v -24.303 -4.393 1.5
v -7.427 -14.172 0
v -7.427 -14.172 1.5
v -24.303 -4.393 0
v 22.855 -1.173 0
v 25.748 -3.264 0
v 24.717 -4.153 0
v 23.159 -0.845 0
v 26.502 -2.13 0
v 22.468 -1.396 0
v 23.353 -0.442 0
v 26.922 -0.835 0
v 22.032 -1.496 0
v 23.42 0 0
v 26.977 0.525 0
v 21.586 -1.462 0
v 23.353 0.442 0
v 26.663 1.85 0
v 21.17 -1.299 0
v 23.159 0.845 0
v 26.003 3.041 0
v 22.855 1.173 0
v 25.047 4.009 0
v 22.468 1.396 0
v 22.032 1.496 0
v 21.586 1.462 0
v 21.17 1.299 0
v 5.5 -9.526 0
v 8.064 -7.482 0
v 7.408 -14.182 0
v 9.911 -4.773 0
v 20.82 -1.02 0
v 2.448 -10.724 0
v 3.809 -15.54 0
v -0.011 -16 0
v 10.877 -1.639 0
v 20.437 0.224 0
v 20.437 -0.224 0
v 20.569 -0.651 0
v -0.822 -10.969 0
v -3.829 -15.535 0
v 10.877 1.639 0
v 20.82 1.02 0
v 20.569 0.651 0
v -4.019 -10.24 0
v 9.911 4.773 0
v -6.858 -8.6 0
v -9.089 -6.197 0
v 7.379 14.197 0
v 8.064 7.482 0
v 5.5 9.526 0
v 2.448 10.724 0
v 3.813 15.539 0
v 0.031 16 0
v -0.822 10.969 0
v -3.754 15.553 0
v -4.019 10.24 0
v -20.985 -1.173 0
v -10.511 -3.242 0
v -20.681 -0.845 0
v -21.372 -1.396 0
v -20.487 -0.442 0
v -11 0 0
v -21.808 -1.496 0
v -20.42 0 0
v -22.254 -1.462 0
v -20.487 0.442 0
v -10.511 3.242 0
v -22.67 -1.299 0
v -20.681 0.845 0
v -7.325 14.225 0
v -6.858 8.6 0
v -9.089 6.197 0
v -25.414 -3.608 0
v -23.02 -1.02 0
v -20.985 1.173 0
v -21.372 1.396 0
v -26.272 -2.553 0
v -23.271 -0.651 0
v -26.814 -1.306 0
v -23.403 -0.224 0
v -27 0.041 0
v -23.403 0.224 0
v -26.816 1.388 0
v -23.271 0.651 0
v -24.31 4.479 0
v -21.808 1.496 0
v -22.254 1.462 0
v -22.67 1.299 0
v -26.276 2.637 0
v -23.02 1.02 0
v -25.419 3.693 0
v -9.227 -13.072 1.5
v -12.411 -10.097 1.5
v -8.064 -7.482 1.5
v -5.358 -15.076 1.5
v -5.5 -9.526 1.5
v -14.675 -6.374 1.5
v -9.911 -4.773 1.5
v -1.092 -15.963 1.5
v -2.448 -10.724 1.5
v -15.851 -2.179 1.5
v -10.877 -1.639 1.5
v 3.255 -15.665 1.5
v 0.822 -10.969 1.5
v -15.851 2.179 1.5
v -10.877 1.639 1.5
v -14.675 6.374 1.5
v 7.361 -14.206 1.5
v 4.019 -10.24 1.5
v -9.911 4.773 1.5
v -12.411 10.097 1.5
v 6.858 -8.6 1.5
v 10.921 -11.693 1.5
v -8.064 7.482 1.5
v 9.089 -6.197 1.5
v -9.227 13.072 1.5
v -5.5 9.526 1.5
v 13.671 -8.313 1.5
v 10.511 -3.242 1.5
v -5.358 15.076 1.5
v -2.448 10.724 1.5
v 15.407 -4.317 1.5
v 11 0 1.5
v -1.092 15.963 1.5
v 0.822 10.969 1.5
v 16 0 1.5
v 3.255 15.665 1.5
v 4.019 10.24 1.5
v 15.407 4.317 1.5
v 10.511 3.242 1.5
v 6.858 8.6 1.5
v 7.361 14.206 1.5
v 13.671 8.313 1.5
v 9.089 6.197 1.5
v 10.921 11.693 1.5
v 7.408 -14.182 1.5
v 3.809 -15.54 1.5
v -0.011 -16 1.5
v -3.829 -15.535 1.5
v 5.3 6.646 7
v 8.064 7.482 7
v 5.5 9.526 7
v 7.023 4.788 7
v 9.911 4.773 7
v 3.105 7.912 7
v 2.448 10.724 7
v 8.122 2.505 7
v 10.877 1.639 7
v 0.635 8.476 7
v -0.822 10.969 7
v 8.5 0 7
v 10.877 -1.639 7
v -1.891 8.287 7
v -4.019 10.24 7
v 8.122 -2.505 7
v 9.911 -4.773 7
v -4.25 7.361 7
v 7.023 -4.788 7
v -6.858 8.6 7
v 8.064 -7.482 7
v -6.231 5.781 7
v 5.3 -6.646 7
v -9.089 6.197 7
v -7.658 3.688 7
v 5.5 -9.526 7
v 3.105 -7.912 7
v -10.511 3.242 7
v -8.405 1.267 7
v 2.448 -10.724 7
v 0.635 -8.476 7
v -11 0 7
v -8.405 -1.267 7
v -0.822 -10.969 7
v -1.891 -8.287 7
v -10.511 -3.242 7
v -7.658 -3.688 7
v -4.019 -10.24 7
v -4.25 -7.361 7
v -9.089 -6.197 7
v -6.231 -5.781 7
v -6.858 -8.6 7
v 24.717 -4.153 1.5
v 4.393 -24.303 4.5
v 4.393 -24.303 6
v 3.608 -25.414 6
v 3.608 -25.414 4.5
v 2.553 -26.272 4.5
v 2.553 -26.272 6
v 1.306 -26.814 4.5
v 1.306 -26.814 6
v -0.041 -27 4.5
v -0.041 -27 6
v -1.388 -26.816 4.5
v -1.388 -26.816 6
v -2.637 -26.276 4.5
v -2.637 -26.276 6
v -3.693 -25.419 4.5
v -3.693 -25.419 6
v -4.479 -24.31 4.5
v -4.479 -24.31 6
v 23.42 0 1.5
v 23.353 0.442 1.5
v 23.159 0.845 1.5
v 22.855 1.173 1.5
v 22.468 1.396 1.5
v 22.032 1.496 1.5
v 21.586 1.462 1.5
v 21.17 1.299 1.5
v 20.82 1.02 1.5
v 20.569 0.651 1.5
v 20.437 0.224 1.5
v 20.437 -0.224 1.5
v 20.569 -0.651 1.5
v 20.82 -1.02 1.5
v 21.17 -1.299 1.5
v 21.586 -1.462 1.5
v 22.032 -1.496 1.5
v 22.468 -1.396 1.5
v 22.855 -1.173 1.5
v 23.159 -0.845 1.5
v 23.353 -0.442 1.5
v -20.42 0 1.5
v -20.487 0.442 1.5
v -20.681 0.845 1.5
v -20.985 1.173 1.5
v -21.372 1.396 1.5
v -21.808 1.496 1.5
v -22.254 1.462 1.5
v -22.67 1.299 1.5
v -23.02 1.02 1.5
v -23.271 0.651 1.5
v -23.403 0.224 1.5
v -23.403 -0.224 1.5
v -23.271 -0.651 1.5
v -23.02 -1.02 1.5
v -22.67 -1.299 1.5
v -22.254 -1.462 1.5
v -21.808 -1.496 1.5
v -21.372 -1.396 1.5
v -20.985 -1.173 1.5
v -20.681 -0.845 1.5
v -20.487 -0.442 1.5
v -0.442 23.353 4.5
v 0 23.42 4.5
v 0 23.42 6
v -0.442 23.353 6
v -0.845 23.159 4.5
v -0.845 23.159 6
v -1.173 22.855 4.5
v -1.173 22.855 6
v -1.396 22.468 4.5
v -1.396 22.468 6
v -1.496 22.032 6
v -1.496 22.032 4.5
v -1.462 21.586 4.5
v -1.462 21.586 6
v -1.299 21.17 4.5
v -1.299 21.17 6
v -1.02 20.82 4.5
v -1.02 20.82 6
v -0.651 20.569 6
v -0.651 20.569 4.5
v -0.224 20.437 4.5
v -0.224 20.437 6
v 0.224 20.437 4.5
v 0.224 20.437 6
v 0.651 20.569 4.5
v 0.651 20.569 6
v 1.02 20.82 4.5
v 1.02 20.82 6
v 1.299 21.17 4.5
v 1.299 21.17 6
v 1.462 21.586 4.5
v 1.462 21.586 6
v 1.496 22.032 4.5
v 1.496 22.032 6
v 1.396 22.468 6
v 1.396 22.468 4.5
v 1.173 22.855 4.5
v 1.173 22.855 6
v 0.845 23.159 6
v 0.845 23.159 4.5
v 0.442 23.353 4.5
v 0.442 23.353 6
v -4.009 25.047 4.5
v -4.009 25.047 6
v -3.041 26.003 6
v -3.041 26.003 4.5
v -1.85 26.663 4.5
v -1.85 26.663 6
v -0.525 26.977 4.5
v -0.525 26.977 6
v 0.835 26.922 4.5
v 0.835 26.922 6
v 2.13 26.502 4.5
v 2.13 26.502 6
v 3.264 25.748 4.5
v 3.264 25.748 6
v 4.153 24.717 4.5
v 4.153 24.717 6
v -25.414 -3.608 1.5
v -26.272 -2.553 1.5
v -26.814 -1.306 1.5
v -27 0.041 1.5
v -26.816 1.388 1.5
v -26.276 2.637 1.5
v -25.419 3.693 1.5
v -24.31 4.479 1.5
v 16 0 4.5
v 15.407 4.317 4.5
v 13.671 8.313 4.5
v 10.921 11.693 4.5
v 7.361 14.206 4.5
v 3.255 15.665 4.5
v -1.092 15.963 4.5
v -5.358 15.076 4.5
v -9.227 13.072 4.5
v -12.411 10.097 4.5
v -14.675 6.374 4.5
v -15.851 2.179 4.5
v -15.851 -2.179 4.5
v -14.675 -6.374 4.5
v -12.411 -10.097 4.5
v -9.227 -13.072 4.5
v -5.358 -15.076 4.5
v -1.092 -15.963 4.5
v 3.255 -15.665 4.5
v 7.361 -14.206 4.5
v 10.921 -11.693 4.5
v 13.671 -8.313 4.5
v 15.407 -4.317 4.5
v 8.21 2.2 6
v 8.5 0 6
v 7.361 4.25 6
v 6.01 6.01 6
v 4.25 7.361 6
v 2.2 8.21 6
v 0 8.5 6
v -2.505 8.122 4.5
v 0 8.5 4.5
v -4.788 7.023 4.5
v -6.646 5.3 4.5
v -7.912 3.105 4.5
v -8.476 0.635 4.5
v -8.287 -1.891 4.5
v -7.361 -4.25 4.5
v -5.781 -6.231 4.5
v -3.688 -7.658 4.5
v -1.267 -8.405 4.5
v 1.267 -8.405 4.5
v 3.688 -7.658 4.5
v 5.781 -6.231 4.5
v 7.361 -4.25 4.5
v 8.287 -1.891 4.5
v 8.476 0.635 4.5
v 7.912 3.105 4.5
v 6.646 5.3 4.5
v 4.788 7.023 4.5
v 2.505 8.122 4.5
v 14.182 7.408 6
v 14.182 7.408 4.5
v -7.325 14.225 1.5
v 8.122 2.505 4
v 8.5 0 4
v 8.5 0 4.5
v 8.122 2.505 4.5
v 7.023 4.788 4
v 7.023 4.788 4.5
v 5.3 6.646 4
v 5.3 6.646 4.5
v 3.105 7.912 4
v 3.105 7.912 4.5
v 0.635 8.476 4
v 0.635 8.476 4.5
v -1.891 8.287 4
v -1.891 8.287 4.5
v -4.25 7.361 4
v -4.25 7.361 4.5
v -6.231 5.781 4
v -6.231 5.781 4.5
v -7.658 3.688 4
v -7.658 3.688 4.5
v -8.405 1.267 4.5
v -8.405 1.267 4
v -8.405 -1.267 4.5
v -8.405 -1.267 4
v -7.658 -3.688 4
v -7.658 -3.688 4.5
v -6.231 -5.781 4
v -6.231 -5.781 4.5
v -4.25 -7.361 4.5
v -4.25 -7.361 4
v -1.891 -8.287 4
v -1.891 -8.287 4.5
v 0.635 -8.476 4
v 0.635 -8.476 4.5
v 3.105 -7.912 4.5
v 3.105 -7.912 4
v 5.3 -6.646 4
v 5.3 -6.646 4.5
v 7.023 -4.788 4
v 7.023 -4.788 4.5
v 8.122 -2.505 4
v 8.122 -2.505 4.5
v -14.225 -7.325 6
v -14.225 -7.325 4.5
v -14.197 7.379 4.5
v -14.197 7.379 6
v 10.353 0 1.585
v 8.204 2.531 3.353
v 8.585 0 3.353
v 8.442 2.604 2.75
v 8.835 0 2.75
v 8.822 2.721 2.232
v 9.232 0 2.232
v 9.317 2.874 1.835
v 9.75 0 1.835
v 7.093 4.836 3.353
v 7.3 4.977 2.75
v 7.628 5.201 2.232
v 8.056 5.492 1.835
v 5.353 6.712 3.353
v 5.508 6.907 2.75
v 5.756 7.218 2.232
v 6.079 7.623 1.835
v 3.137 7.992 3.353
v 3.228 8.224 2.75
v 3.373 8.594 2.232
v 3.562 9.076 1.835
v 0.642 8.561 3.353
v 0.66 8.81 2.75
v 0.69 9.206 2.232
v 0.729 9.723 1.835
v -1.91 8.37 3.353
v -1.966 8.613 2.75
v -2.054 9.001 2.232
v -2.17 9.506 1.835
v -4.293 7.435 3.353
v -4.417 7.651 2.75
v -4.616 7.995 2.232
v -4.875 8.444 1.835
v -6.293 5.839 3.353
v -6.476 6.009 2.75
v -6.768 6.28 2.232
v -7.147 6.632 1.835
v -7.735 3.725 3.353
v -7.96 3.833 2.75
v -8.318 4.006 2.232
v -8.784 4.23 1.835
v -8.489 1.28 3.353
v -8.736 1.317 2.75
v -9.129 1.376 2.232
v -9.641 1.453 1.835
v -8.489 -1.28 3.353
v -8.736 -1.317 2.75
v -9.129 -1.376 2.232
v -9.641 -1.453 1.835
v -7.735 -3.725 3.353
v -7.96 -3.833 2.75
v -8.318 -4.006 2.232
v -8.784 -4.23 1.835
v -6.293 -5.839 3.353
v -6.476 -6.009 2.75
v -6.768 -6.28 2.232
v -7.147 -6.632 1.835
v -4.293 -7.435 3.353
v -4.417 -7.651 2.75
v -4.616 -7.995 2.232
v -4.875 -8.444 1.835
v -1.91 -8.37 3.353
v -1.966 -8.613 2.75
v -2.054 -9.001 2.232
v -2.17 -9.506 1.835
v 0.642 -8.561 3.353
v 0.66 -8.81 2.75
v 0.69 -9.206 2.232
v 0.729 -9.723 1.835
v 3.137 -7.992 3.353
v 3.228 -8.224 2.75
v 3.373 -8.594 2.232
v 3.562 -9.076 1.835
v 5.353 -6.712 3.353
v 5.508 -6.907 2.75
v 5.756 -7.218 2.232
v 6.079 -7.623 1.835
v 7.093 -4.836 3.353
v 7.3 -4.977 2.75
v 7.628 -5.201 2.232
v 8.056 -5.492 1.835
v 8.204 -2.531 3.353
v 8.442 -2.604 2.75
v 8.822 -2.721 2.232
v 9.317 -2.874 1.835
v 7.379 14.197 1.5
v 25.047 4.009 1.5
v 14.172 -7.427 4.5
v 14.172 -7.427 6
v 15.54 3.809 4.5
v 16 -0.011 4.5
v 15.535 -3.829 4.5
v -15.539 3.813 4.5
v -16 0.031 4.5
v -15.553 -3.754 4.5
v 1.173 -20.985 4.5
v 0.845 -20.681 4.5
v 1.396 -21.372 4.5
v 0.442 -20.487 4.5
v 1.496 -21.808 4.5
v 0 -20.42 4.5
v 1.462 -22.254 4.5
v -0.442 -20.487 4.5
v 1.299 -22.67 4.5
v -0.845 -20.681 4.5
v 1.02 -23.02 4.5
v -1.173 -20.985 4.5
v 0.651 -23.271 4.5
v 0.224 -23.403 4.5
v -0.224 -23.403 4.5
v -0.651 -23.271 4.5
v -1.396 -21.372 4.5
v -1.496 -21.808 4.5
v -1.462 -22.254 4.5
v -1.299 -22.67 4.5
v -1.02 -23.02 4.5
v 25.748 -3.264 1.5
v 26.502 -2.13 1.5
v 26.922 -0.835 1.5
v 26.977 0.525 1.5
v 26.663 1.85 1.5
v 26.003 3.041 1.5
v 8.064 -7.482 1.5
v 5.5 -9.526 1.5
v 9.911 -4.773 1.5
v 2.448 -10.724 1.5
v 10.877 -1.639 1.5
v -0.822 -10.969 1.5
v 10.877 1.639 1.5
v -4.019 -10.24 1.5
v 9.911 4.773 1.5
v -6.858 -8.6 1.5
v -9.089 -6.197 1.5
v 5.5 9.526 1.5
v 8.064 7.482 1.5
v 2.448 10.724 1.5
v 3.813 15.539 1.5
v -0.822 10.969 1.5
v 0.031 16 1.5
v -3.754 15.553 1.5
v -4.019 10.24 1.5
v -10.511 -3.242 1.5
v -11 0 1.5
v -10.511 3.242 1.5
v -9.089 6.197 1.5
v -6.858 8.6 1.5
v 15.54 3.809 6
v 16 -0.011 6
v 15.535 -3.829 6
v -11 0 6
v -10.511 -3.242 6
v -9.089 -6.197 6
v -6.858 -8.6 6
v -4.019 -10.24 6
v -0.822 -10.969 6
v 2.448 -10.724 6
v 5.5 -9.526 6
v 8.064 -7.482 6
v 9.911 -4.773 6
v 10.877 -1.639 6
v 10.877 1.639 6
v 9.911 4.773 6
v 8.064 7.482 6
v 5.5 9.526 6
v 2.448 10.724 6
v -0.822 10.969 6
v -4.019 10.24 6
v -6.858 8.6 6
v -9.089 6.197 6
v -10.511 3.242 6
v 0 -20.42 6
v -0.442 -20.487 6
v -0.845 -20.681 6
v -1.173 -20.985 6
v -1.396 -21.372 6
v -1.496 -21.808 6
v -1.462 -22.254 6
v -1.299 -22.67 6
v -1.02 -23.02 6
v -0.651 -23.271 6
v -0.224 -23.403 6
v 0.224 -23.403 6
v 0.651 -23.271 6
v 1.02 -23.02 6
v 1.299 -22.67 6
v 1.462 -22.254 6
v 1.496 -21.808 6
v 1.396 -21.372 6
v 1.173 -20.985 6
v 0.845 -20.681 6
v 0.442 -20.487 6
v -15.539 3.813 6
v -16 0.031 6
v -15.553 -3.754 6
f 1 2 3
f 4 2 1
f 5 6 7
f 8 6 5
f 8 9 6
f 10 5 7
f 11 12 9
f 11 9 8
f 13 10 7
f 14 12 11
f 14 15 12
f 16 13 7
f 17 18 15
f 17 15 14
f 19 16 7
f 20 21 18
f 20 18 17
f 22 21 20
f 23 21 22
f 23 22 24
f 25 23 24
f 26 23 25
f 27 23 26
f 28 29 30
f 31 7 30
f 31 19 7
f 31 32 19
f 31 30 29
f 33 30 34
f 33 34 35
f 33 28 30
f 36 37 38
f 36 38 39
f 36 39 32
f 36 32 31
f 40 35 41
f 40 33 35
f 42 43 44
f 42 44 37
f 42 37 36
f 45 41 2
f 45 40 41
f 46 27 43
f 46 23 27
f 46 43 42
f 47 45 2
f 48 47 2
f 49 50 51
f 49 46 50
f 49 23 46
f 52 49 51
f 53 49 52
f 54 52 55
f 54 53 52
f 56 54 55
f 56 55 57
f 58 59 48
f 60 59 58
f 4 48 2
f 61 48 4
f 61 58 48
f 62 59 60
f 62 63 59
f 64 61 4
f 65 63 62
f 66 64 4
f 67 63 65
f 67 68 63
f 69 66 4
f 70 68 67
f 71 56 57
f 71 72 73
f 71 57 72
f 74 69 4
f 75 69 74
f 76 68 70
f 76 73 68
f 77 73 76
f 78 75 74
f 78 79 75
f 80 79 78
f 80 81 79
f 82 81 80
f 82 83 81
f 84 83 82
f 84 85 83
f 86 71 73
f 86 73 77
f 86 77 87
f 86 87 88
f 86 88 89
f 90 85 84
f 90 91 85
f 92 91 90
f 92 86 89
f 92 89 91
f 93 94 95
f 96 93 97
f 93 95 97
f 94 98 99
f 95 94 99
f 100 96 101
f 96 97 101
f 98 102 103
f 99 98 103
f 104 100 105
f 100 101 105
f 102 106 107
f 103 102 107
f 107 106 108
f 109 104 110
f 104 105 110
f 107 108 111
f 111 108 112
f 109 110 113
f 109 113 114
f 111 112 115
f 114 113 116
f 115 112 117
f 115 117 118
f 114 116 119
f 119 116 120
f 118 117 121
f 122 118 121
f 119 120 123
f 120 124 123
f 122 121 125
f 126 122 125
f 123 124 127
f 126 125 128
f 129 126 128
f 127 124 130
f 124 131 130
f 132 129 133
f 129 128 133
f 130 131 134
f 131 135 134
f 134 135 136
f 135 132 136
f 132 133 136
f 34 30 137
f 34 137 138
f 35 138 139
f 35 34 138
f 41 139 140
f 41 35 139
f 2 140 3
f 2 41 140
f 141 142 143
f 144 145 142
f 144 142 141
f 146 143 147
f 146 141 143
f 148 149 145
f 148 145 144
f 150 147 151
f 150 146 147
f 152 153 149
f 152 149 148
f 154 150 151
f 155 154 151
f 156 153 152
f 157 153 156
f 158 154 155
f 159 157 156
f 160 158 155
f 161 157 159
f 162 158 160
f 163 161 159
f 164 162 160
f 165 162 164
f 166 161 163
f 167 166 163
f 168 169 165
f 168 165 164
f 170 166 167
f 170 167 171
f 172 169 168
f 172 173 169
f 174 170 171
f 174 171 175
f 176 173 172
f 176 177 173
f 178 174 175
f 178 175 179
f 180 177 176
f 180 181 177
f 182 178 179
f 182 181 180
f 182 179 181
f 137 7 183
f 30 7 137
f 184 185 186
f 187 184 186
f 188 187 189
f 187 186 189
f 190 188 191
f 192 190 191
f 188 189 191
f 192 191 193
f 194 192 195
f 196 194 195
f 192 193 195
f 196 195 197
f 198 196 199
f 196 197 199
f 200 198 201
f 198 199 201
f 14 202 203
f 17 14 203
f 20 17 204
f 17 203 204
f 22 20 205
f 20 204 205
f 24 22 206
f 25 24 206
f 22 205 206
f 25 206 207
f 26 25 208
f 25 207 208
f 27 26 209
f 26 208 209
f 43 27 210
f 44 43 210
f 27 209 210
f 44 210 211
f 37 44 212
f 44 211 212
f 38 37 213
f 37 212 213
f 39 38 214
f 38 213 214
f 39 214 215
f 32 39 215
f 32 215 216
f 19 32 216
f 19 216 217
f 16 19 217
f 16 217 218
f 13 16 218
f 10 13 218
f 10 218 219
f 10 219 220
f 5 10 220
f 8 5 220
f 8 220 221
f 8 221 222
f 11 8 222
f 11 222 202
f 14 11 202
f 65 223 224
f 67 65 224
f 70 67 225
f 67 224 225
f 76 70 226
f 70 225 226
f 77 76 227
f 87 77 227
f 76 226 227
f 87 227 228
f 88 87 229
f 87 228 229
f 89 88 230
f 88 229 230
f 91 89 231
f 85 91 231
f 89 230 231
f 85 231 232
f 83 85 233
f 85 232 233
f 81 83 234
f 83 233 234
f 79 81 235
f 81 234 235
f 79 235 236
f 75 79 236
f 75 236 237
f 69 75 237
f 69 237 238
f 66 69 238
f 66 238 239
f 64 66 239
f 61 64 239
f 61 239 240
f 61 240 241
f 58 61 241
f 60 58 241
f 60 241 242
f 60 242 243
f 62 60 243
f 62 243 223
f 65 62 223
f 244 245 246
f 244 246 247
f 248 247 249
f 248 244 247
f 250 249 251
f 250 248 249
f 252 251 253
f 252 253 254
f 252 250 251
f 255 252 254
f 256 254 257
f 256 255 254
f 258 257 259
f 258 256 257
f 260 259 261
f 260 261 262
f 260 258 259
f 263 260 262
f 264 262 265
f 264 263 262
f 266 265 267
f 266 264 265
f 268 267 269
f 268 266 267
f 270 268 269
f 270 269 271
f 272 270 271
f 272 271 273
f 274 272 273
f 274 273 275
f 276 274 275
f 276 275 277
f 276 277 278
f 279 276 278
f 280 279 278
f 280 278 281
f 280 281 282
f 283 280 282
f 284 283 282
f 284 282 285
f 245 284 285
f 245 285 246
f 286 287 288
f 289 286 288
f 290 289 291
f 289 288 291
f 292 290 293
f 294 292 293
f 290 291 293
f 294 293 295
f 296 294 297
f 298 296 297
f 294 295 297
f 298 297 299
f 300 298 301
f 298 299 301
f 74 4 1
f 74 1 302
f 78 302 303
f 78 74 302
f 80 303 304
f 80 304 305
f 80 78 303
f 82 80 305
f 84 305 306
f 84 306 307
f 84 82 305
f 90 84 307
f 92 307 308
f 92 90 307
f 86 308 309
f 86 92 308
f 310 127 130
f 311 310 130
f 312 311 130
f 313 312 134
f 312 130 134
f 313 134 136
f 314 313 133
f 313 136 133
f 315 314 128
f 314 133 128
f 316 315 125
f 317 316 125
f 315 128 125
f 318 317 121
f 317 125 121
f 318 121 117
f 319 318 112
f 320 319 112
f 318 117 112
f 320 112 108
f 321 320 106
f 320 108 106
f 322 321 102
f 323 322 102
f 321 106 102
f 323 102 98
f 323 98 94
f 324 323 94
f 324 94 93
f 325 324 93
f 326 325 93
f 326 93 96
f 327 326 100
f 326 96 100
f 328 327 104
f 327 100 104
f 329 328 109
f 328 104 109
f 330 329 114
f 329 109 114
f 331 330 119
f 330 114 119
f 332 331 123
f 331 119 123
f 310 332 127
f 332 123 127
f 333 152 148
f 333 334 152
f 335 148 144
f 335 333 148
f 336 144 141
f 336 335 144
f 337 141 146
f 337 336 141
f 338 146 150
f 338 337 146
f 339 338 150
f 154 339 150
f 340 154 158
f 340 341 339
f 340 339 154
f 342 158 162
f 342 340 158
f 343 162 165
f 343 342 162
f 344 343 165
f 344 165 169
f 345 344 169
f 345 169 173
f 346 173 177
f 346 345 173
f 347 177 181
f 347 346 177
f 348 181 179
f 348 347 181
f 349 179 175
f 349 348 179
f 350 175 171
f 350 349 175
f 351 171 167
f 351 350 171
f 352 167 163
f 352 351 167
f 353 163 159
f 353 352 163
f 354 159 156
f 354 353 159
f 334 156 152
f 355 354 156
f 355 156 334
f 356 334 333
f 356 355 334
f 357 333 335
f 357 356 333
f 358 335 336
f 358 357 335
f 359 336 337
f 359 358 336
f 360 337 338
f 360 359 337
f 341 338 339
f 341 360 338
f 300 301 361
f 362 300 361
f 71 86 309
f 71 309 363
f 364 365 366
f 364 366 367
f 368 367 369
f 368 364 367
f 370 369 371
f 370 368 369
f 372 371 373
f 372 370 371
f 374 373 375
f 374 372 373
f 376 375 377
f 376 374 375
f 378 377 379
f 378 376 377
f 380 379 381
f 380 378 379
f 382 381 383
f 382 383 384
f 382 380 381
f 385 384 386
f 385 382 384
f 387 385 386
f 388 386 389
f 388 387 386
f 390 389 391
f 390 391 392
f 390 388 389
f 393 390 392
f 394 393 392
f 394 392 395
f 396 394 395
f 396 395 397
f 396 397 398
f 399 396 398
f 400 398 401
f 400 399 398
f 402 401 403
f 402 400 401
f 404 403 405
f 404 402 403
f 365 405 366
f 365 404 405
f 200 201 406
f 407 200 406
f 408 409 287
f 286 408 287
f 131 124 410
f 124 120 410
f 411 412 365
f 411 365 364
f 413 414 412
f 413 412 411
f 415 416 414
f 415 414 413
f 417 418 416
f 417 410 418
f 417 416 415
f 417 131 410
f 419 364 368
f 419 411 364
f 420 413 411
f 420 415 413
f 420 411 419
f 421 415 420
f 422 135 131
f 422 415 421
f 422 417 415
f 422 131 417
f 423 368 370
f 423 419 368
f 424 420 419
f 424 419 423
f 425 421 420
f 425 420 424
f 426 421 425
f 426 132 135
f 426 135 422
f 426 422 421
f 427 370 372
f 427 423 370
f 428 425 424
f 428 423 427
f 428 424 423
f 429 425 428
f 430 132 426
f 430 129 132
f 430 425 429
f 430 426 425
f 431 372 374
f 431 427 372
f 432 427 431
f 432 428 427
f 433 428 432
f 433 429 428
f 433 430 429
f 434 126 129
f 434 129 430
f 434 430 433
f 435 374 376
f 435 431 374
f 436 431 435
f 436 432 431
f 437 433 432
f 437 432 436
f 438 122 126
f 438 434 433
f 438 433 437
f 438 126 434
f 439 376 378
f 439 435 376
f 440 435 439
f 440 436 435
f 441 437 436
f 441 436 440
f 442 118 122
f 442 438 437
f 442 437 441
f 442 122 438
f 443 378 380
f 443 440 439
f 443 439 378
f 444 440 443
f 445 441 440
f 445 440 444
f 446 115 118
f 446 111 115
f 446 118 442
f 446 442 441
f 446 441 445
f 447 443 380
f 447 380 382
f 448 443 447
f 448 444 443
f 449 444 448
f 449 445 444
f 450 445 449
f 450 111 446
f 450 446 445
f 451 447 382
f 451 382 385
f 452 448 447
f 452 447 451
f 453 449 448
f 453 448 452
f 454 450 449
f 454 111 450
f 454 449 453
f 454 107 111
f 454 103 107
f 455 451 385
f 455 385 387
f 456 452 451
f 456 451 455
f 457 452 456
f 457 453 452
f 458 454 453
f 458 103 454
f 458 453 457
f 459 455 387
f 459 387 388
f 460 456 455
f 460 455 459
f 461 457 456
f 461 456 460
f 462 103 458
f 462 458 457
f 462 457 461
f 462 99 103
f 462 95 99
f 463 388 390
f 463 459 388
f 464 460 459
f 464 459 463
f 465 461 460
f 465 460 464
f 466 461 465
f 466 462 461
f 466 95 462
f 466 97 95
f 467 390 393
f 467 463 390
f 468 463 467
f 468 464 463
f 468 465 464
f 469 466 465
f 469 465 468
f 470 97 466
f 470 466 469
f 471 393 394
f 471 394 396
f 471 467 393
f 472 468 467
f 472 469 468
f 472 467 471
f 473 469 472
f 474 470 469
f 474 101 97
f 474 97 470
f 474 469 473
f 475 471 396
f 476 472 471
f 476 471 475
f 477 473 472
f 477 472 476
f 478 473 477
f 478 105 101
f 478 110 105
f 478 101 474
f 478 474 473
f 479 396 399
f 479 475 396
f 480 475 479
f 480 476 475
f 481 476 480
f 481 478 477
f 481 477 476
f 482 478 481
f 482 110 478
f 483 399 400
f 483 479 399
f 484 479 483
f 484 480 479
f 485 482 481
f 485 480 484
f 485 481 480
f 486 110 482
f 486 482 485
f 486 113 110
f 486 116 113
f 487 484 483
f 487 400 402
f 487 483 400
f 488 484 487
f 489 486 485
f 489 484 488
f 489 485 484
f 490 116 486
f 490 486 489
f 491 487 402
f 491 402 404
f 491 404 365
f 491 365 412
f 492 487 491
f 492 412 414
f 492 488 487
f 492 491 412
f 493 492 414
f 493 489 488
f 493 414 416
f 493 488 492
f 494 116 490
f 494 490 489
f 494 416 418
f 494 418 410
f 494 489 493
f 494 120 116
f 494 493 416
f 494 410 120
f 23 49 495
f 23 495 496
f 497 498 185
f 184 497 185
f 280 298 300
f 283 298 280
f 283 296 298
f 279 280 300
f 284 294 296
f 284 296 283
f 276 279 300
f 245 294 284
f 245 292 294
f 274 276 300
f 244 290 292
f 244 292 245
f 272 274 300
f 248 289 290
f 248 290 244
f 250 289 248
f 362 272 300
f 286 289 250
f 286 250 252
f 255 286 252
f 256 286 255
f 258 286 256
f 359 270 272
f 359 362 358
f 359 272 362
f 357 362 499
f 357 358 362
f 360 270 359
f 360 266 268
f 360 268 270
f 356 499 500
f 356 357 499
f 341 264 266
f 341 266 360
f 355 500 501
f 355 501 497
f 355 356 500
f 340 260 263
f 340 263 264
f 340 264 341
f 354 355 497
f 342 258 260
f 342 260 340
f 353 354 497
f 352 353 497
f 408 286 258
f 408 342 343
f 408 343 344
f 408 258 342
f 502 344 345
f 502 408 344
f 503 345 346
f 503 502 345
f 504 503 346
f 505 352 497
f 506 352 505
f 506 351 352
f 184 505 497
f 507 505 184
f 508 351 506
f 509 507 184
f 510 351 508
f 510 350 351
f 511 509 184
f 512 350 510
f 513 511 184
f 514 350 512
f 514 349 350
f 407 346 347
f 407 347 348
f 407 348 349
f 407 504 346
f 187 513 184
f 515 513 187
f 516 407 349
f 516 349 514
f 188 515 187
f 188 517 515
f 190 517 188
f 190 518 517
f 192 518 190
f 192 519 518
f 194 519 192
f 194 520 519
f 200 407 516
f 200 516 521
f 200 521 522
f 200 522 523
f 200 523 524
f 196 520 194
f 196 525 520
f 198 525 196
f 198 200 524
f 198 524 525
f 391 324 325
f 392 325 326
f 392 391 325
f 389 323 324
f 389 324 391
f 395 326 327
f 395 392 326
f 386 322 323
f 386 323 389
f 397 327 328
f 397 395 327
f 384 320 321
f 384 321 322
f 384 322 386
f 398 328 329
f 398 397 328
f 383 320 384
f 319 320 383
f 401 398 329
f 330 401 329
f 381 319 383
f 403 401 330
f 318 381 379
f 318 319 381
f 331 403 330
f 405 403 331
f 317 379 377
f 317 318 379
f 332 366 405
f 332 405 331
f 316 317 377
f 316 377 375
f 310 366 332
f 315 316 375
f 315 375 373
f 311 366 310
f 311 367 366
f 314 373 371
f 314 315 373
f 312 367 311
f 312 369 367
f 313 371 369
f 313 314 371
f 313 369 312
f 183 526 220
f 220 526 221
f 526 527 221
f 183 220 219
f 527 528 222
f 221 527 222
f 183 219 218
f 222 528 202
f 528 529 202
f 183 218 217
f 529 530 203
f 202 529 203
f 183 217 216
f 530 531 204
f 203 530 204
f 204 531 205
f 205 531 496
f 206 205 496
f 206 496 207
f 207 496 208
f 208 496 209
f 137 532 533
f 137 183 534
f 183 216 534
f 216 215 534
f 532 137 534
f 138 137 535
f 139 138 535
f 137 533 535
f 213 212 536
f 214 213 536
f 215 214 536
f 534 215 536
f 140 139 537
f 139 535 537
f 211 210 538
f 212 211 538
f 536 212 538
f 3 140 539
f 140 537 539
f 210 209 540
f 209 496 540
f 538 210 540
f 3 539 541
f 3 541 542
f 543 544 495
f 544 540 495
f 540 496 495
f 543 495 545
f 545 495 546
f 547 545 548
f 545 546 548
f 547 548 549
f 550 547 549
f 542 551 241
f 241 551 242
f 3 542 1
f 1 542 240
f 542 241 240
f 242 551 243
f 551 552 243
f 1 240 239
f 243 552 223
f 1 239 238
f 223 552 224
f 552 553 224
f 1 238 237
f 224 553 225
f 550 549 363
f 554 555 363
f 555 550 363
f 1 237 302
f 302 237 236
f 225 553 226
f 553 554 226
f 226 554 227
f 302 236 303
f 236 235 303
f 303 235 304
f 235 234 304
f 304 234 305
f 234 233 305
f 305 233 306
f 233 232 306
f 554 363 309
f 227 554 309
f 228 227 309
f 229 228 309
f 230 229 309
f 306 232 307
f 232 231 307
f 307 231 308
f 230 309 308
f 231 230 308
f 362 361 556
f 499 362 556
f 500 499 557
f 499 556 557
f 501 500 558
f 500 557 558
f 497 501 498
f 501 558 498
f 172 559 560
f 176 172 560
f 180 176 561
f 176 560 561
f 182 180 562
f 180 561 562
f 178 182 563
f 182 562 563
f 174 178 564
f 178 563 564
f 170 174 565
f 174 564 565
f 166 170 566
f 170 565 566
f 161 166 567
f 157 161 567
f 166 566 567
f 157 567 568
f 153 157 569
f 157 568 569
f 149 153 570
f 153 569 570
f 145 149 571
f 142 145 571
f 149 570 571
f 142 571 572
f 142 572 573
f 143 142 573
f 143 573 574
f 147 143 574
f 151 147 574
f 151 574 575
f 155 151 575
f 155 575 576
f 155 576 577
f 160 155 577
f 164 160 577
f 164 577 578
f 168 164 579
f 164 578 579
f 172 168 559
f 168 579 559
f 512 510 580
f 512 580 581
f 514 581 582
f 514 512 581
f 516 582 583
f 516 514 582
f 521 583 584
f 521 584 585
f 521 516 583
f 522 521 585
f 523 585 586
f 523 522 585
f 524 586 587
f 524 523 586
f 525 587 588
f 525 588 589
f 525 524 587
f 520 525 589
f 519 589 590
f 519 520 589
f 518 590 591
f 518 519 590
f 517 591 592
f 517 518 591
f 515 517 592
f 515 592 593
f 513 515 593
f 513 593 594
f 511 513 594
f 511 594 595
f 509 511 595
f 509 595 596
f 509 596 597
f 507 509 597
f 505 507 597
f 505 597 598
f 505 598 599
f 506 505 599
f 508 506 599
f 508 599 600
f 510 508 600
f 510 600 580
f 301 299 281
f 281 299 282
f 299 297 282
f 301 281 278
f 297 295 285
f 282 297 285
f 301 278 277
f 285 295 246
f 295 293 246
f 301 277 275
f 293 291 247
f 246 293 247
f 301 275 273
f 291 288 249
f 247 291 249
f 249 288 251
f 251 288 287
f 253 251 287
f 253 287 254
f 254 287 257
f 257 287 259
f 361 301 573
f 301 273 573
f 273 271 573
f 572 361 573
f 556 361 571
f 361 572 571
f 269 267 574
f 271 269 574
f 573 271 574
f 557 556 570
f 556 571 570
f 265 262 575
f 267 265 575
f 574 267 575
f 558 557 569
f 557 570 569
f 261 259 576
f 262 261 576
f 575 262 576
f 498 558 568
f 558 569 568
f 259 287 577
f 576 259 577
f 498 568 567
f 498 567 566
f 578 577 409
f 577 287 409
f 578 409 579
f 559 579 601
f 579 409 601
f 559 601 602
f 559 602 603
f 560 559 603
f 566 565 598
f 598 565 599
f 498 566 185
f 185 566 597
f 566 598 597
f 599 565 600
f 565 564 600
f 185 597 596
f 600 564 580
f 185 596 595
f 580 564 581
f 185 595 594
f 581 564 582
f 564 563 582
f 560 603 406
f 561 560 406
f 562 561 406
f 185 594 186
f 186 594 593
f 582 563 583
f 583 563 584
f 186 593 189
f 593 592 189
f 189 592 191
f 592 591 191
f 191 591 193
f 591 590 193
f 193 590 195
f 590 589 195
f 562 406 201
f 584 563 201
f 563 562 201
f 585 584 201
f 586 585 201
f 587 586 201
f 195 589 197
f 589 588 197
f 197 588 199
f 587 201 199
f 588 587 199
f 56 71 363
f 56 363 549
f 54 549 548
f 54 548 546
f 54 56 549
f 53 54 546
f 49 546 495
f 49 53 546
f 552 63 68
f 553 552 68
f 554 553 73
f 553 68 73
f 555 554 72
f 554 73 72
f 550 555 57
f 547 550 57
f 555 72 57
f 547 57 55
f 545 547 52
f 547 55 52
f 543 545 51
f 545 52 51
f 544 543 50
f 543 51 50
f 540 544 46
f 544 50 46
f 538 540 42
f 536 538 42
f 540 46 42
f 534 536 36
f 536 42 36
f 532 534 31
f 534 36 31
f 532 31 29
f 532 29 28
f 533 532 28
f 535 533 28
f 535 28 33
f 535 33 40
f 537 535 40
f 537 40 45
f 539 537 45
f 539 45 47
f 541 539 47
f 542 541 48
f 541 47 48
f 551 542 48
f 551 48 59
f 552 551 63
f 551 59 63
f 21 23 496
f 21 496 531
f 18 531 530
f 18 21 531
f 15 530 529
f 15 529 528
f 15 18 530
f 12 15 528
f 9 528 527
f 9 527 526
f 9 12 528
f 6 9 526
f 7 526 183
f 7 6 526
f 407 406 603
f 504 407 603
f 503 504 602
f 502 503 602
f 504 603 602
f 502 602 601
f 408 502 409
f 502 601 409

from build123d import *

# Parameters (mm, degrees)
BOSS_EXTRUDE1_DEPTH      = 1.5
SKETCH2_R                = 1.5
SKETCH2_R_2              = 8.5
CUT_EXTRUDE1_DEPTH       = 32.420495375
BODY_MOVE_COPY1_ANGLE    = 90
BOSS_EXTRUDE2_DEPTH      = 1.5
BOSS_EXTRUDE2_DEPTH_BACK = 1.5
SKETCH3_R                = 16
SKETCH3_R_2              = 8.5
SKETCH4_R                = 11
CUT_EXTRUDE2_DEPTH       = 1.5
FILLET1_R                = 2.5
SKETCH6_R                = 11
SKETCH6_R_2              = 8.5
BOSS_EXTRUDE4_DEPTH      = 1


with BuildPart() as part:
    # Sketch1 → Boss-Extrude1 (new body)
    with BuildSketch(Plane.XY):
        with BuildLine():
            Line((7.379381976, 14.196644732), (25.046611975, 4.009443432))
            ThreePointArc((25.046611975, 4.009443432), (26.995880172, -0.156936678), (24.716922459, -4.152524428))
            Line((24.716922459, -4.152524428), (7.407985651, -14.181739971))
            ThreePointArc((7.407985651, -14.181739971), (-0.010581597, -15.999996501), (-7.426737349, -14.171929027))
            Line((-7.426737349, -14.171929027), (-24.302900872, -4.393201109))
            ThreePointArc((-24.302900872, -4.393201109), (-26.99995272, 0.040951738), (-24.309846191, 4.479321596))
            Line((-24.309846191, 4.479321596), (-7.325019927, 14.224770053))
            ThreePointArc((-7.325019927, 14.224770053), (0.030603374, 15.999970732), (7.379381976, 14.196644732))
        make_face()
    extrude(amount=BOSS_EXTRUDE1_DEPTH)

    # Sketch2 → Cut-Extrude1 (cut, through all)
    with BuildSketch(Plane.XY.offset(1.5)):
        with Locations((-21.92, 0)):
            Circle(SKETCH2_R)
        with Locations((21.92, 0)):
            Circle(SKETCH2_R)
        Circle(SKETCH2_R_2)
    extrude(amount=-CUT_EXTRUDE1_DEPTH, mode=Mode.SUBTRACT)


with BuildPart() as body_2:
    # Mirror2: mirrored copy
    add(part.part.mirror(Plane.XY.offset(3)))


with BuildPart() as body_2_1:
    # Body-Move/Copy1: moved
    add(body_2.part.rotate(Axis((0, 0, 0), (0, 0, 1)), BODY_MOVE_COPY1_ANGLE))

    # Sketch6 → Boss-Extrude4 (add)
    with BuildSketch(Plane.XY.offset(6)):
        with Locations(Location((0, 0, 0), (0, 0, 180))):
            Circle(SKETCH6_R)
        Circle(SKETCH6_R_2, mode=Mode.SUBTRACT)
    extrude(amount=BOSS_EXTRUDE4_DEPTH)


with BuildPart() as body_3:
    # Sketch3 → Boss-Extrude2 (new, two sides: drawn at the far end of the back side and taken through both)
    with BuildSketch(Plane.XY.offset(3).offset(-BOSS_EXTRUDE2_DEPTH_BACK)):
        Circle(SKETCH3_R)
        Circle(SKETCH3_R_2, mode=Mode.SUBTRACT)
    extrude(amount=BOSS_EXTRUDE2_DEPTH + BOSS_EXTRUDE2_DEPTH_BACK)

    # Fillet1
    fillet1_edges = [body_3.edges().sort_by_distance(p)[0] for p in [
        (-8.5, 0, 1.5),
    ]]
    fillet(fillet1_edges, radius=FILLET1_R)


with BuildPart() as part_1:
    add(part.part)

    # Sketch4 → Cut-Extrude2 (cut)
    with BuildSketch(Plane(origin=(0, 0, 0), x_dir=(-1, 0, 0), z_dir=(0, 0, -1))):
        Circle(SKETCH4_R)
    extrude(amount=-CUT_EXTRUDE2_DEPTH, mode=Mode.SUBTRACT)


solid = Compound([body_2_1.part, body_3.part, part_1.part])
